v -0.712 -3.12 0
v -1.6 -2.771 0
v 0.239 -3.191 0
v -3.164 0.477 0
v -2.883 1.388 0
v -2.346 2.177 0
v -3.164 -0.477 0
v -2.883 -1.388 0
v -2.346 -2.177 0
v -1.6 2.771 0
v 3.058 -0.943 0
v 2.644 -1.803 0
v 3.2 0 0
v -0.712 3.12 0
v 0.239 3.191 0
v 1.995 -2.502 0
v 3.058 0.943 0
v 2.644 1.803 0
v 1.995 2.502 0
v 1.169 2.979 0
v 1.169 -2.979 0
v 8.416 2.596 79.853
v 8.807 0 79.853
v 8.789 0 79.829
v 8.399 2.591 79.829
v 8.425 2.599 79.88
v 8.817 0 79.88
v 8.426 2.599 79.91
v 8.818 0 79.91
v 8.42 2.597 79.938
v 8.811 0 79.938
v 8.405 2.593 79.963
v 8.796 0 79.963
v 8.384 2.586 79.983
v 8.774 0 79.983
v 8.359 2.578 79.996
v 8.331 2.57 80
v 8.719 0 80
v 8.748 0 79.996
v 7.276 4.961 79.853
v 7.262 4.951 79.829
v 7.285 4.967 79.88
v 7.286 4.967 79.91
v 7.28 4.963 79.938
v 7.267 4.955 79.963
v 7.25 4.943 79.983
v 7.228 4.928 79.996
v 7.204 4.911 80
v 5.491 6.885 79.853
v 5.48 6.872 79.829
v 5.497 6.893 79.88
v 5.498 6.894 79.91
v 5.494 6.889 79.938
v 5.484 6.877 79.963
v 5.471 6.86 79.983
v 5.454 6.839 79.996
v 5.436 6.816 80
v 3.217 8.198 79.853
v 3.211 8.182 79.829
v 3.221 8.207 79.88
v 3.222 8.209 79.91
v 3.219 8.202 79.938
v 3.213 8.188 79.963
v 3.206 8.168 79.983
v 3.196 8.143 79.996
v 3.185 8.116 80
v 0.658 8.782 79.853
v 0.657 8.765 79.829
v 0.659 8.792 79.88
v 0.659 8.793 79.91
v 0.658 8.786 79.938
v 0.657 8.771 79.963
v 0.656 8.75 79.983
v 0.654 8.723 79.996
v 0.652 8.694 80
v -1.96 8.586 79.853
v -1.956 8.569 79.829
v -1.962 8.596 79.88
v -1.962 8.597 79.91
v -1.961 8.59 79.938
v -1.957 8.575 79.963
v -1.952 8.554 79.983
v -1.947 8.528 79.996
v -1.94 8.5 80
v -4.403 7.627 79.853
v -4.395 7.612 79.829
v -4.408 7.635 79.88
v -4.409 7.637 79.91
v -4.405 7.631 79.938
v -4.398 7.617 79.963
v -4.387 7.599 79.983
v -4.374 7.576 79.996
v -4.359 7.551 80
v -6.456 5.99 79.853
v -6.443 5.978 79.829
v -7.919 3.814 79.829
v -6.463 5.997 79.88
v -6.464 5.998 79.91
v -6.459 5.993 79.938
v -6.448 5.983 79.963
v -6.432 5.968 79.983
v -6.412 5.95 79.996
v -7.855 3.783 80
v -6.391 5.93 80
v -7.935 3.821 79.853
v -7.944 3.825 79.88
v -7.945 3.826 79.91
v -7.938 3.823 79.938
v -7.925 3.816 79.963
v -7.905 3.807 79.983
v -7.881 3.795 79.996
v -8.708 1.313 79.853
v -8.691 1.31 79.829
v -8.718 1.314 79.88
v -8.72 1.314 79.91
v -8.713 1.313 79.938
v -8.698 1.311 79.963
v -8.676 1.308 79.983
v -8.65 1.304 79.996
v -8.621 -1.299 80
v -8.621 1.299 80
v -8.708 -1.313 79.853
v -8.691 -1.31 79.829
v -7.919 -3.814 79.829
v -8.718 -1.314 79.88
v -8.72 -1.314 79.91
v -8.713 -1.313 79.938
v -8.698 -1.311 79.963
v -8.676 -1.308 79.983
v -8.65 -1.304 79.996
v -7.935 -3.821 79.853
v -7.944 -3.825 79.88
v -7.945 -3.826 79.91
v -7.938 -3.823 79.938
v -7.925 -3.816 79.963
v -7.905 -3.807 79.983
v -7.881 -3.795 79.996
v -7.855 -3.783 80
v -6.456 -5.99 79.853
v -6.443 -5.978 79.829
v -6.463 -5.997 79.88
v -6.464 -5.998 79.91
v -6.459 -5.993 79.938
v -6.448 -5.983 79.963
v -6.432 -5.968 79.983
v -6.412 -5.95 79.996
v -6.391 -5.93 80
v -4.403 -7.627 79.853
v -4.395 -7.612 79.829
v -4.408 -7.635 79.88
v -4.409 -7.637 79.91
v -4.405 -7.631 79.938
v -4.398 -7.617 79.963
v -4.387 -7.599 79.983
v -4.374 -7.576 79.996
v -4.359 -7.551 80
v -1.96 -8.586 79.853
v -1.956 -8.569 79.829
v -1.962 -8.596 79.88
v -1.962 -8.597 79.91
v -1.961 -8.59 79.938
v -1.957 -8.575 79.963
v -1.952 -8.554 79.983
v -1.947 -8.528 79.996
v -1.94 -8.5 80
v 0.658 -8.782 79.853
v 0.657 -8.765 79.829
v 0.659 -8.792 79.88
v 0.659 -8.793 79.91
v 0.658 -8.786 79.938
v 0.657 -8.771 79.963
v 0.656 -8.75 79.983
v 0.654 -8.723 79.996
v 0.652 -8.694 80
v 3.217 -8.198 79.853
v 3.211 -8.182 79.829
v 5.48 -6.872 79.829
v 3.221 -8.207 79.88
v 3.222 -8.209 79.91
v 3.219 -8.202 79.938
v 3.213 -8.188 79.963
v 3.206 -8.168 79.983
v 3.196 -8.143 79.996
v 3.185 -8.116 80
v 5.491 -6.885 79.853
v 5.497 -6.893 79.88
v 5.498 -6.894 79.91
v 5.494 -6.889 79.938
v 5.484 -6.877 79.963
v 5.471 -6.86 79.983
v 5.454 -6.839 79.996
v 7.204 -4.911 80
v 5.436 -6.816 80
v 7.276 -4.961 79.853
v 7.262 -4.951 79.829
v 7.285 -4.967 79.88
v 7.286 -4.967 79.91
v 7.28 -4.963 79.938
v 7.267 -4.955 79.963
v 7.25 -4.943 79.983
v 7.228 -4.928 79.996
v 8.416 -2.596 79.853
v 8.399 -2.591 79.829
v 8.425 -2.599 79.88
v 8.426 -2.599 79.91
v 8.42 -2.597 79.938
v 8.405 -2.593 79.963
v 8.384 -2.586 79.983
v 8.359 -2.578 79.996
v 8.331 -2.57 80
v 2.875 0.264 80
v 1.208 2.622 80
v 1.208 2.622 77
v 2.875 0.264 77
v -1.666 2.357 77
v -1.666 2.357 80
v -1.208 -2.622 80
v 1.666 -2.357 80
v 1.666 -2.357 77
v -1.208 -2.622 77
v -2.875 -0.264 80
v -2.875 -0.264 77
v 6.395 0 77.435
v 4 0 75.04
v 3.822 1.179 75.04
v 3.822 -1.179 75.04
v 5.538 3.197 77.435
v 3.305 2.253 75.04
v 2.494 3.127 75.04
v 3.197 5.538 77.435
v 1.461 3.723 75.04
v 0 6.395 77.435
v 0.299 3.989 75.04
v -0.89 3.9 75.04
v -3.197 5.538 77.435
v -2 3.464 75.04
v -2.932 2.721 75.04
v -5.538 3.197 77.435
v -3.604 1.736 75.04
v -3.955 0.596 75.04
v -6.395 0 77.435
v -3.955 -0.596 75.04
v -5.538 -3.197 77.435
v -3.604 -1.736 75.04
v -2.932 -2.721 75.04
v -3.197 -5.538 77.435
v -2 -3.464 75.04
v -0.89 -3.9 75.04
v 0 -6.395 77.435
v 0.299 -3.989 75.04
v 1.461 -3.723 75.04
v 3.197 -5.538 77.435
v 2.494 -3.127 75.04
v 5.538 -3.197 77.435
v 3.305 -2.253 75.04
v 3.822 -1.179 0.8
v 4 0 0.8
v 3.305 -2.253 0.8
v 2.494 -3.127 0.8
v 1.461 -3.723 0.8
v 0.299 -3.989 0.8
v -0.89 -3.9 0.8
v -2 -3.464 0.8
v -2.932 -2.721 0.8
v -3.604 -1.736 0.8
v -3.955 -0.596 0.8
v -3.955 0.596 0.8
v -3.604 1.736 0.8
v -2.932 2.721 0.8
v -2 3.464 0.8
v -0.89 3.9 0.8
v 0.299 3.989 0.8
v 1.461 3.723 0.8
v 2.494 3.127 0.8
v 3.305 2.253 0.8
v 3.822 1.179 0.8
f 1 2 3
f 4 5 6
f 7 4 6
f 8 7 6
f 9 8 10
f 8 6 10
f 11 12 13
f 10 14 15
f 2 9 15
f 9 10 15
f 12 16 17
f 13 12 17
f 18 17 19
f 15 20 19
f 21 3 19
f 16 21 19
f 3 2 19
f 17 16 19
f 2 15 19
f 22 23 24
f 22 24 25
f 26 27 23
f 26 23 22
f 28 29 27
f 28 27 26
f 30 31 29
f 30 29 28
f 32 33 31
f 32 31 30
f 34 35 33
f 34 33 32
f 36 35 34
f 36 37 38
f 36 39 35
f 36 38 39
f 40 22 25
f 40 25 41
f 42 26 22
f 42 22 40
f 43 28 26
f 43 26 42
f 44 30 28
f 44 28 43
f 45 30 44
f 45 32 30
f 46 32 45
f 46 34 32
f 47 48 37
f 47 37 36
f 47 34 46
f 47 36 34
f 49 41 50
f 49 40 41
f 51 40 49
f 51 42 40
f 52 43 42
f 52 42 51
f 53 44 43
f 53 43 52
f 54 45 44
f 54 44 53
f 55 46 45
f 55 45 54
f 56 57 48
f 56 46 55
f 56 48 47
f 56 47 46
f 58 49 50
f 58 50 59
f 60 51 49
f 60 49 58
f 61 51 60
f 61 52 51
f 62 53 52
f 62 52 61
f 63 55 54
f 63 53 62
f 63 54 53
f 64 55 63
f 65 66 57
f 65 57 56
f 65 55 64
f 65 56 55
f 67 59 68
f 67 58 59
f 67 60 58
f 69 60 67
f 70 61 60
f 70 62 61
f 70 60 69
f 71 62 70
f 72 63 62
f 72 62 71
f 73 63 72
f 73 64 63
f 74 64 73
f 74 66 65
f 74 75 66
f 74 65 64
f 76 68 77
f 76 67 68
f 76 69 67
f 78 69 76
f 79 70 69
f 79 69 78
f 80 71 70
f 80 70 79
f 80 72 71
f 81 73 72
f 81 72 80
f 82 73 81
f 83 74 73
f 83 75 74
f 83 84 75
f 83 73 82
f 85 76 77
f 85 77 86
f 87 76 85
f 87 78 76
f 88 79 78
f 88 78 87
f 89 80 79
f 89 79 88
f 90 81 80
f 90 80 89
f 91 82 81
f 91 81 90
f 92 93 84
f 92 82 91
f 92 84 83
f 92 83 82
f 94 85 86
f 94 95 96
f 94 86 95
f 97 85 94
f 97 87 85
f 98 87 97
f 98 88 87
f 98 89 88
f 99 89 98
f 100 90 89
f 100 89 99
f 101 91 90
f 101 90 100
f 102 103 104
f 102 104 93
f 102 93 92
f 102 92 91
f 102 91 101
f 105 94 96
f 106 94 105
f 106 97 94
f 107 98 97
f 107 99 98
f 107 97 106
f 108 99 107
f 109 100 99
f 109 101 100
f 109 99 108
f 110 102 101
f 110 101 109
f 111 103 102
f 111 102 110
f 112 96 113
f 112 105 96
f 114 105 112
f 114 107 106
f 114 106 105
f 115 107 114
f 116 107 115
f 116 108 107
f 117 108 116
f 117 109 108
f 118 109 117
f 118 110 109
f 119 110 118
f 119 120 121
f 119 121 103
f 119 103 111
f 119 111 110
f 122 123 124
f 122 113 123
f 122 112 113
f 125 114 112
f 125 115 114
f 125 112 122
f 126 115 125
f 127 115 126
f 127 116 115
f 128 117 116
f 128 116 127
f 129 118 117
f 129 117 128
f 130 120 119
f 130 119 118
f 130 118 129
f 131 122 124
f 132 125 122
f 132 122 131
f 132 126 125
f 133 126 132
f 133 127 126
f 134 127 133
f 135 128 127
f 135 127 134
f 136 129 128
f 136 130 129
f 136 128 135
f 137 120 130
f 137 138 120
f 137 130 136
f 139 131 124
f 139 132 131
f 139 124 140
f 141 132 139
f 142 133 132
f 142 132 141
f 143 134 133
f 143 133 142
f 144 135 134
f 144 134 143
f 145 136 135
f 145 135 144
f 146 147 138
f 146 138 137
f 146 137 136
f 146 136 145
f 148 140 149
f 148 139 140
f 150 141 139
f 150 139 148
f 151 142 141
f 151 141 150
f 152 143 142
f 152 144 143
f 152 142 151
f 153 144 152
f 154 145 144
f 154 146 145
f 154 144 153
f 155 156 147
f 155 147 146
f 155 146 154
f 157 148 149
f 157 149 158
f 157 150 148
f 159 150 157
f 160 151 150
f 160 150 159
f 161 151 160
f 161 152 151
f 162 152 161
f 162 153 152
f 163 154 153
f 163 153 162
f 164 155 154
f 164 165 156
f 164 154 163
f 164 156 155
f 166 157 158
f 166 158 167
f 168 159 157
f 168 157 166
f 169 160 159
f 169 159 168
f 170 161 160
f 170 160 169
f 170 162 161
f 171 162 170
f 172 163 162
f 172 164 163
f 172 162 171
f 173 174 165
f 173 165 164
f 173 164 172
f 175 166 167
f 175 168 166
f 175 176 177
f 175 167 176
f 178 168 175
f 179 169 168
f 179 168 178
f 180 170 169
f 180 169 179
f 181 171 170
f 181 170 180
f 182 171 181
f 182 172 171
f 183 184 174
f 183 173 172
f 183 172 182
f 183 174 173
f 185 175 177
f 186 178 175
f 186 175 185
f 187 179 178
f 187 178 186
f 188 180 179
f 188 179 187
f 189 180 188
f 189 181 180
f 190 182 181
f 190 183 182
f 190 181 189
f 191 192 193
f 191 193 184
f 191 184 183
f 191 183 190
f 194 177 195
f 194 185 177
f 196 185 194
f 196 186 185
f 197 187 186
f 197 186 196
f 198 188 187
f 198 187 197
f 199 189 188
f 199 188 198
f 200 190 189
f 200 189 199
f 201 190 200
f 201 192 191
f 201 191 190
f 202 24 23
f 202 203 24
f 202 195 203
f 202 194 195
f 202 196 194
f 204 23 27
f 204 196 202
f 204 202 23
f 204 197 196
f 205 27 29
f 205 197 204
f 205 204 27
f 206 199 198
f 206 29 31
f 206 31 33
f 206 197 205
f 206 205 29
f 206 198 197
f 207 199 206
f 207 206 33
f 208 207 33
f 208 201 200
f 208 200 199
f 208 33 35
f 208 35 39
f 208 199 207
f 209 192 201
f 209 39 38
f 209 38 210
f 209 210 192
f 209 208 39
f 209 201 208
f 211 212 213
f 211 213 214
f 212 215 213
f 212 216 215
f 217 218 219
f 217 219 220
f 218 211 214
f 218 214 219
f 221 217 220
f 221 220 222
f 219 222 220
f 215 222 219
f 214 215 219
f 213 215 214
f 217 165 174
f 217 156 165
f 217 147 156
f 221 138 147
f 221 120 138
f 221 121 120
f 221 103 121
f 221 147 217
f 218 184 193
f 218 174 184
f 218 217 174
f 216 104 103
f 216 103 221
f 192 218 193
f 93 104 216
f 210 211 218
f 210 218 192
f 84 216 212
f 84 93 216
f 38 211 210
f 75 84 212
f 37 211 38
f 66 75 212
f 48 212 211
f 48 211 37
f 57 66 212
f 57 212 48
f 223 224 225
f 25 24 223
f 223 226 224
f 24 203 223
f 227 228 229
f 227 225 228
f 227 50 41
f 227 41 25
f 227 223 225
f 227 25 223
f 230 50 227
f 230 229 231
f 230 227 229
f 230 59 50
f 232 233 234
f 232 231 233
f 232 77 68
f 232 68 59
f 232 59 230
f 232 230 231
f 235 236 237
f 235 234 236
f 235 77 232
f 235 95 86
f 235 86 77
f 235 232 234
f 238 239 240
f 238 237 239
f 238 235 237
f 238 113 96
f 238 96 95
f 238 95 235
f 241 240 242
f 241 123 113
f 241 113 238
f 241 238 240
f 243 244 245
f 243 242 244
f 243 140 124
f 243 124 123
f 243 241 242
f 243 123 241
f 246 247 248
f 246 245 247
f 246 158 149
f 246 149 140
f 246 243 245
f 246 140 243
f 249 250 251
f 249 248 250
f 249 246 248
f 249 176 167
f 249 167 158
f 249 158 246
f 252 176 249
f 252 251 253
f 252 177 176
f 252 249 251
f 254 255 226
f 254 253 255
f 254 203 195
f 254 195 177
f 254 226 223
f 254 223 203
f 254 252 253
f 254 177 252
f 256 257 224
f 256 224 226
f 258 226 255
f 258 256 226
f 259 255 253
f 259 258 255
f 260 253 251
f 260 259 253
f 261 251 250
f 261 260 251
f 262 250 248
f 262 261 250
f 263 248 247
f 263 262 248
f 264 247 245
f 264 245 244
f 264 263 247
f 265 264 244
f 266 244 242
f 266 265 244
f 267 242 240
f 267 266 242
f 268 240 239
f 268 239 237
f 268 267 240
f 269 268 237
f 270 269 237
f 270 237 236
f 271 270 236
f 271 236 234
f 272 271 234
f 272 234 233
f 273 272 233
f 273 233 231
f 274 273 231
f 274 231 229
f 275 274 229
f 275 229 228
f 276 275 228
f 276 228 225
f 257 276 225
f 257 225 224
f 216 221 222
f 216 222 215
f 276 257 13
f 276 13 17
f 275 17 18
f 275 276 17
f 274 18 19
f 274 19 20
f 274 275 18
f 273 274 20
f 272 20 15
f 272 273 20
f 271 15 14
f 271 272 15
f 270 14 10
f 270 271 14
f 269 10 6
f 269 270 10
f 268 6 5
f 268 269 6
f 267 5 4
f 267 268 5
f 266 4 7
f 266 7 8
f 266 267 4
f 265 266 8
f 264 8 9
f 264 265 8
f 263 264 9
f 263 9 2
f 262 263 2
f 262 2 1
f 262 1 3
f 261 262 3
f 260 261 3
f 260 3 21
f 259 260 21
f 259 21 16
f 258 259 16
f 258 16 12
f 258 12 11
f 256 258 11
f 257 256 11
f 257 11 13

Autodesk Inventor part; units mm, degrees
ref_plane "YZ Plane" through (0, 0, 0) normal (1, 0, 0) x (0, 1, 0)
ref_plane "XZ Plane" through (0, 0, 0) normal (0, 1, 0) x (-1, 0, 0)
ref_plane "XY Plane" through (0, 0, 0) normal (0, 0, 1) x (1, 0, 0)
sketch "Sketch1" plane through (0, 0, 0) normal (0, 0, 1) x (1, 0, 0)
  circle A0 centre (0, 0) radius 4
  dimension "Diameter" = 8
extrude "Extrusion1" add sketch "Sketch1" along normal blind 75.04
sketch "Sketch2" plane through (0, 0, 75.04) normal (0, 0, 1) x (1, 0, 0)
  circle A0 centre (0, 0) radius 4 projected
extrude "Extrusion2" add sketch "Sketch2" along normal blind 4.96 draft 45
sketch "Sketch3" plane through (0, 0, 80) normal (0, 0, 1) x (1, 0, 0)
  circle A0 centre (0, 0) radius 8.96 projected
  circle A1 centre (0, 0) radius 2.8868 construction
  line L0 (1.2084, 2.6217) -> (2.8746, 0.2644)
  line L1 (2.8746, 0.2644) -> (1.6662, -2.3573)
  line L2 (1.6662, -2.3573) -> (-1.2084, -2.6217)
  line L3 (-1.2084, -2.6217) -> (-2.8746, -0.2644)
  line L4 (-2.8746, -0.2644) -> (-1.6662, 2.3573)
  line L5 (-1.6662, 2.3573) -> (1.2084, 2.6217)
  dimension "Hex_Width" = 5
extrude "Extrusion3" cut sketch "Sketch3" against normal blind 3 contours L0 L1 L2 L3 L4 L5
thread "Thread1" size "M8x1.25" class "4g6g" standard "ANSI Metric M Profile" length 45
chamfer "Chamfer2" distance 0.8 angle 45 1 edges at (-4, 0, 0)
fillet "Fillet1" radius 0.1 1 edges at (-8.96, 0, 80)
equation "\"d10\" = Thread_Length"
equation "\"d13\" = Chamfer"
equation "\"Thread_Length\" = 45"
equation "\"Chamfer\" = 0.8"
properties part number "SCREW,FLAT HD,P, 5,M8X1.25X80MM"
